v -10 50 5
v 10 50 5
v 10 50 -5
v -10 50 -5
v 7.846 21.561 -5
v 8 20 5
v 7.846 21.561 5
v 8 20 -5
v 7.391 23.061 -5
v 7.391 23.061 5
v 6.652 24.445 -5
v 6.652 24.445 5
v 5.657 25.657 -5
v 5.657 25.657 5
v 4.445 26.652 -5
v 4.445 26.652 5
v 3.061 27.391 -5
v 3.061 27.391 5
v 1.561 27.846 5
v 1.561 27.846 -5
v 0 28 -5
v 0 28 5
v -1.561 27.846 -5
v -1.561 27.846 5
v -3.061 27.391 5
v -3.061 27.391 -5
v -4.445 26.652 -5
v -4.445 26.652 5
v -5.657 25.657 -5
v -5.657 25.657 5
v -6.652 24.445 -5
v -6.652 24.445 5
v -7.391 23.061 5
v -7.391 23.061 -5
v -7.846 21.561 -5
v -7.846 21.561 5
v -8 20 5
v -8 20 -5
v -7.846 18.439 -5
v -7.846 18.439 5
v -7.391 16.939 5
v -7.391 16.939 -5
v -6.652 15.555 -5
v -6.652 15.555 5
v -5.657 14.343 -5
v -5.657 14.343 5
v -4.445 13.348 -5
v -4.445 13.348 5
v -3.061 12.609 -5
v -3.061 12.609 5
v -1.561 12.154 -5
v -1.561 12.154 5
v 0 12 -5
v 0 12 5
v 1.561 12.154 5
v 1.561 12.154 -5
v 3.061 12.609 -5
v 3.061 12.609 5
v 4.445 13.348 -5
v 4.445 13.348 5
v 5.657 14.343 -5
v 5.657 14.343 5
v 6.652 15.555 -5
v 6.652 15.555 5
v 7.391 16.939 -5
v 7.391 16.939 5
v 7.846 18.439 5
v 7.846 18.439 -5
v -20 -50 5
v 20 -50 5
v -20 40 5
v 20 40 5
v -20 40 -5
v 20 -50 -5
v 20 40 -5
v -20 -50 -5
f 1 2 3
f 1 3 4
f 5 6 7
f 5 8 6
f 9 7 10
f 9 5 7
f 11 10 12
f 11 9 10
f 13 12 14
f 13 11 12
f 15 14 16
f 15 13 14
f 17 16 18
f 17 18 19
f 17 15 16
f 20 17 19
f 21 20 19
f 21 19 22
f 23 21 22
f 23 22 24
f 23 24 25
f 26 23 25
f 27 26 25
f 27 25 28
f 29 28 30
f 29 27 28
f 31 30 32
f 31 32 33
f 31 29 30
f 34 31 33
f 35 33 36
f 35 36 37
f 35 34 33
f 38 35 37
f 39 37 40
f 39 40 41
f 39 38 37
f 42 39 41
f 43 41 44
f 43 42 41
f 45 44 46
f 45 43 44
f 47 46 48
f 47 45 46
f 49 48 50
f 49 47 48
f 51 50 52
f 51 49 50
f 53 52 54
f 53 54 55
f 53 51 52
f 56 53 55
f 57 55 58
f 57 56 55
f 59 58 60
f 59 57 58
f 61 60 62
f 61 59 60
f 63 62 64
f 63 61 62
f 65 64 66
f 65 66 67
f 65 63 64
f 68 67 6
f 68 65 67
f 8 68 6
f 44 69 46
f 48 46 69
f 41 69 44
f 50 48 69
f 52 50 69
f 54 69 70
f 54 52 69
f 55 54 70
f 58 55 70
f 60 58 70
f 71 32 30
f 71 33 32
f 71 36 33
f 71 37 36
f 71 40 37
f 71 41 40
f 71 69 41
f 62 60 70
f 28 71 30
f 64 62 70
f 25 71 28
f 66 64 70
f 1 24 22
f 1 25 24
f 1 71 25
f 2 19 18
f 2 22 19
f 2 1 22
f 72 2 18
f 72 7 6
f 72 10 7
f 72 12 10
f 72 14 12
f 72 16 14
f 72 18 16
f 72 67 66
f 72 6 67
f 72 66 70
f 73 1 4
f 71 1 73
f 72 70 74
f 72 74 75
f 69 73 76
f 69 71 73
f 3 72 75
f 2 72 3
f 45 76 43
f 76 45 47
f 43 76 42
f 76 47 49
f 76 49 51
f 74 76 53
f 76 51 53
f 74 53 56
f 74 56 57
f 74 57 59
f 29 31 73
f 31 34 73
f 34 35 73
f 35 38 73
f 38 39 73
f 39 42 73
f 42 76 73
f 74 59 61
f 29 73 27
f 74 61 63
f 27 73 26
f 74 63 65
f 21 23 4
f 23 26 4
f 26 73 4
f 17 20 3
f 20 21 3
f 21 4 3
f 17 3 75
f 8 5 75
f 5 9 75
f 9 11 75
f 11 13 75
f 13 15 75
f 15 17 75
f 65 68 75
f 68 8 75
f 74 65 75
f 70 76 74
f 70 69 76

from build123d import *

# Parameters (mm, degrees)
SKETCH1_R           = 8
BOSS_EXTRUDE1_DEPTH = 5


with BuildPart() as part:
    # Sketch1 → Boss-Extrude1 (new, symmetric)
    with BuildSketch(Plane.XY):
        Polygon((-20, -50), (20, -50), (20, 40), (10, 50), (-10, 50), (-20, 40), align=None)
        with Locations((0, 20)):
            Circle(SKETCH1_R, mode=Mode.SUBTRACT)
    extrude(amount=BOSS_EXTRUDE1_DEPTH, both=True)


solid = part.part
